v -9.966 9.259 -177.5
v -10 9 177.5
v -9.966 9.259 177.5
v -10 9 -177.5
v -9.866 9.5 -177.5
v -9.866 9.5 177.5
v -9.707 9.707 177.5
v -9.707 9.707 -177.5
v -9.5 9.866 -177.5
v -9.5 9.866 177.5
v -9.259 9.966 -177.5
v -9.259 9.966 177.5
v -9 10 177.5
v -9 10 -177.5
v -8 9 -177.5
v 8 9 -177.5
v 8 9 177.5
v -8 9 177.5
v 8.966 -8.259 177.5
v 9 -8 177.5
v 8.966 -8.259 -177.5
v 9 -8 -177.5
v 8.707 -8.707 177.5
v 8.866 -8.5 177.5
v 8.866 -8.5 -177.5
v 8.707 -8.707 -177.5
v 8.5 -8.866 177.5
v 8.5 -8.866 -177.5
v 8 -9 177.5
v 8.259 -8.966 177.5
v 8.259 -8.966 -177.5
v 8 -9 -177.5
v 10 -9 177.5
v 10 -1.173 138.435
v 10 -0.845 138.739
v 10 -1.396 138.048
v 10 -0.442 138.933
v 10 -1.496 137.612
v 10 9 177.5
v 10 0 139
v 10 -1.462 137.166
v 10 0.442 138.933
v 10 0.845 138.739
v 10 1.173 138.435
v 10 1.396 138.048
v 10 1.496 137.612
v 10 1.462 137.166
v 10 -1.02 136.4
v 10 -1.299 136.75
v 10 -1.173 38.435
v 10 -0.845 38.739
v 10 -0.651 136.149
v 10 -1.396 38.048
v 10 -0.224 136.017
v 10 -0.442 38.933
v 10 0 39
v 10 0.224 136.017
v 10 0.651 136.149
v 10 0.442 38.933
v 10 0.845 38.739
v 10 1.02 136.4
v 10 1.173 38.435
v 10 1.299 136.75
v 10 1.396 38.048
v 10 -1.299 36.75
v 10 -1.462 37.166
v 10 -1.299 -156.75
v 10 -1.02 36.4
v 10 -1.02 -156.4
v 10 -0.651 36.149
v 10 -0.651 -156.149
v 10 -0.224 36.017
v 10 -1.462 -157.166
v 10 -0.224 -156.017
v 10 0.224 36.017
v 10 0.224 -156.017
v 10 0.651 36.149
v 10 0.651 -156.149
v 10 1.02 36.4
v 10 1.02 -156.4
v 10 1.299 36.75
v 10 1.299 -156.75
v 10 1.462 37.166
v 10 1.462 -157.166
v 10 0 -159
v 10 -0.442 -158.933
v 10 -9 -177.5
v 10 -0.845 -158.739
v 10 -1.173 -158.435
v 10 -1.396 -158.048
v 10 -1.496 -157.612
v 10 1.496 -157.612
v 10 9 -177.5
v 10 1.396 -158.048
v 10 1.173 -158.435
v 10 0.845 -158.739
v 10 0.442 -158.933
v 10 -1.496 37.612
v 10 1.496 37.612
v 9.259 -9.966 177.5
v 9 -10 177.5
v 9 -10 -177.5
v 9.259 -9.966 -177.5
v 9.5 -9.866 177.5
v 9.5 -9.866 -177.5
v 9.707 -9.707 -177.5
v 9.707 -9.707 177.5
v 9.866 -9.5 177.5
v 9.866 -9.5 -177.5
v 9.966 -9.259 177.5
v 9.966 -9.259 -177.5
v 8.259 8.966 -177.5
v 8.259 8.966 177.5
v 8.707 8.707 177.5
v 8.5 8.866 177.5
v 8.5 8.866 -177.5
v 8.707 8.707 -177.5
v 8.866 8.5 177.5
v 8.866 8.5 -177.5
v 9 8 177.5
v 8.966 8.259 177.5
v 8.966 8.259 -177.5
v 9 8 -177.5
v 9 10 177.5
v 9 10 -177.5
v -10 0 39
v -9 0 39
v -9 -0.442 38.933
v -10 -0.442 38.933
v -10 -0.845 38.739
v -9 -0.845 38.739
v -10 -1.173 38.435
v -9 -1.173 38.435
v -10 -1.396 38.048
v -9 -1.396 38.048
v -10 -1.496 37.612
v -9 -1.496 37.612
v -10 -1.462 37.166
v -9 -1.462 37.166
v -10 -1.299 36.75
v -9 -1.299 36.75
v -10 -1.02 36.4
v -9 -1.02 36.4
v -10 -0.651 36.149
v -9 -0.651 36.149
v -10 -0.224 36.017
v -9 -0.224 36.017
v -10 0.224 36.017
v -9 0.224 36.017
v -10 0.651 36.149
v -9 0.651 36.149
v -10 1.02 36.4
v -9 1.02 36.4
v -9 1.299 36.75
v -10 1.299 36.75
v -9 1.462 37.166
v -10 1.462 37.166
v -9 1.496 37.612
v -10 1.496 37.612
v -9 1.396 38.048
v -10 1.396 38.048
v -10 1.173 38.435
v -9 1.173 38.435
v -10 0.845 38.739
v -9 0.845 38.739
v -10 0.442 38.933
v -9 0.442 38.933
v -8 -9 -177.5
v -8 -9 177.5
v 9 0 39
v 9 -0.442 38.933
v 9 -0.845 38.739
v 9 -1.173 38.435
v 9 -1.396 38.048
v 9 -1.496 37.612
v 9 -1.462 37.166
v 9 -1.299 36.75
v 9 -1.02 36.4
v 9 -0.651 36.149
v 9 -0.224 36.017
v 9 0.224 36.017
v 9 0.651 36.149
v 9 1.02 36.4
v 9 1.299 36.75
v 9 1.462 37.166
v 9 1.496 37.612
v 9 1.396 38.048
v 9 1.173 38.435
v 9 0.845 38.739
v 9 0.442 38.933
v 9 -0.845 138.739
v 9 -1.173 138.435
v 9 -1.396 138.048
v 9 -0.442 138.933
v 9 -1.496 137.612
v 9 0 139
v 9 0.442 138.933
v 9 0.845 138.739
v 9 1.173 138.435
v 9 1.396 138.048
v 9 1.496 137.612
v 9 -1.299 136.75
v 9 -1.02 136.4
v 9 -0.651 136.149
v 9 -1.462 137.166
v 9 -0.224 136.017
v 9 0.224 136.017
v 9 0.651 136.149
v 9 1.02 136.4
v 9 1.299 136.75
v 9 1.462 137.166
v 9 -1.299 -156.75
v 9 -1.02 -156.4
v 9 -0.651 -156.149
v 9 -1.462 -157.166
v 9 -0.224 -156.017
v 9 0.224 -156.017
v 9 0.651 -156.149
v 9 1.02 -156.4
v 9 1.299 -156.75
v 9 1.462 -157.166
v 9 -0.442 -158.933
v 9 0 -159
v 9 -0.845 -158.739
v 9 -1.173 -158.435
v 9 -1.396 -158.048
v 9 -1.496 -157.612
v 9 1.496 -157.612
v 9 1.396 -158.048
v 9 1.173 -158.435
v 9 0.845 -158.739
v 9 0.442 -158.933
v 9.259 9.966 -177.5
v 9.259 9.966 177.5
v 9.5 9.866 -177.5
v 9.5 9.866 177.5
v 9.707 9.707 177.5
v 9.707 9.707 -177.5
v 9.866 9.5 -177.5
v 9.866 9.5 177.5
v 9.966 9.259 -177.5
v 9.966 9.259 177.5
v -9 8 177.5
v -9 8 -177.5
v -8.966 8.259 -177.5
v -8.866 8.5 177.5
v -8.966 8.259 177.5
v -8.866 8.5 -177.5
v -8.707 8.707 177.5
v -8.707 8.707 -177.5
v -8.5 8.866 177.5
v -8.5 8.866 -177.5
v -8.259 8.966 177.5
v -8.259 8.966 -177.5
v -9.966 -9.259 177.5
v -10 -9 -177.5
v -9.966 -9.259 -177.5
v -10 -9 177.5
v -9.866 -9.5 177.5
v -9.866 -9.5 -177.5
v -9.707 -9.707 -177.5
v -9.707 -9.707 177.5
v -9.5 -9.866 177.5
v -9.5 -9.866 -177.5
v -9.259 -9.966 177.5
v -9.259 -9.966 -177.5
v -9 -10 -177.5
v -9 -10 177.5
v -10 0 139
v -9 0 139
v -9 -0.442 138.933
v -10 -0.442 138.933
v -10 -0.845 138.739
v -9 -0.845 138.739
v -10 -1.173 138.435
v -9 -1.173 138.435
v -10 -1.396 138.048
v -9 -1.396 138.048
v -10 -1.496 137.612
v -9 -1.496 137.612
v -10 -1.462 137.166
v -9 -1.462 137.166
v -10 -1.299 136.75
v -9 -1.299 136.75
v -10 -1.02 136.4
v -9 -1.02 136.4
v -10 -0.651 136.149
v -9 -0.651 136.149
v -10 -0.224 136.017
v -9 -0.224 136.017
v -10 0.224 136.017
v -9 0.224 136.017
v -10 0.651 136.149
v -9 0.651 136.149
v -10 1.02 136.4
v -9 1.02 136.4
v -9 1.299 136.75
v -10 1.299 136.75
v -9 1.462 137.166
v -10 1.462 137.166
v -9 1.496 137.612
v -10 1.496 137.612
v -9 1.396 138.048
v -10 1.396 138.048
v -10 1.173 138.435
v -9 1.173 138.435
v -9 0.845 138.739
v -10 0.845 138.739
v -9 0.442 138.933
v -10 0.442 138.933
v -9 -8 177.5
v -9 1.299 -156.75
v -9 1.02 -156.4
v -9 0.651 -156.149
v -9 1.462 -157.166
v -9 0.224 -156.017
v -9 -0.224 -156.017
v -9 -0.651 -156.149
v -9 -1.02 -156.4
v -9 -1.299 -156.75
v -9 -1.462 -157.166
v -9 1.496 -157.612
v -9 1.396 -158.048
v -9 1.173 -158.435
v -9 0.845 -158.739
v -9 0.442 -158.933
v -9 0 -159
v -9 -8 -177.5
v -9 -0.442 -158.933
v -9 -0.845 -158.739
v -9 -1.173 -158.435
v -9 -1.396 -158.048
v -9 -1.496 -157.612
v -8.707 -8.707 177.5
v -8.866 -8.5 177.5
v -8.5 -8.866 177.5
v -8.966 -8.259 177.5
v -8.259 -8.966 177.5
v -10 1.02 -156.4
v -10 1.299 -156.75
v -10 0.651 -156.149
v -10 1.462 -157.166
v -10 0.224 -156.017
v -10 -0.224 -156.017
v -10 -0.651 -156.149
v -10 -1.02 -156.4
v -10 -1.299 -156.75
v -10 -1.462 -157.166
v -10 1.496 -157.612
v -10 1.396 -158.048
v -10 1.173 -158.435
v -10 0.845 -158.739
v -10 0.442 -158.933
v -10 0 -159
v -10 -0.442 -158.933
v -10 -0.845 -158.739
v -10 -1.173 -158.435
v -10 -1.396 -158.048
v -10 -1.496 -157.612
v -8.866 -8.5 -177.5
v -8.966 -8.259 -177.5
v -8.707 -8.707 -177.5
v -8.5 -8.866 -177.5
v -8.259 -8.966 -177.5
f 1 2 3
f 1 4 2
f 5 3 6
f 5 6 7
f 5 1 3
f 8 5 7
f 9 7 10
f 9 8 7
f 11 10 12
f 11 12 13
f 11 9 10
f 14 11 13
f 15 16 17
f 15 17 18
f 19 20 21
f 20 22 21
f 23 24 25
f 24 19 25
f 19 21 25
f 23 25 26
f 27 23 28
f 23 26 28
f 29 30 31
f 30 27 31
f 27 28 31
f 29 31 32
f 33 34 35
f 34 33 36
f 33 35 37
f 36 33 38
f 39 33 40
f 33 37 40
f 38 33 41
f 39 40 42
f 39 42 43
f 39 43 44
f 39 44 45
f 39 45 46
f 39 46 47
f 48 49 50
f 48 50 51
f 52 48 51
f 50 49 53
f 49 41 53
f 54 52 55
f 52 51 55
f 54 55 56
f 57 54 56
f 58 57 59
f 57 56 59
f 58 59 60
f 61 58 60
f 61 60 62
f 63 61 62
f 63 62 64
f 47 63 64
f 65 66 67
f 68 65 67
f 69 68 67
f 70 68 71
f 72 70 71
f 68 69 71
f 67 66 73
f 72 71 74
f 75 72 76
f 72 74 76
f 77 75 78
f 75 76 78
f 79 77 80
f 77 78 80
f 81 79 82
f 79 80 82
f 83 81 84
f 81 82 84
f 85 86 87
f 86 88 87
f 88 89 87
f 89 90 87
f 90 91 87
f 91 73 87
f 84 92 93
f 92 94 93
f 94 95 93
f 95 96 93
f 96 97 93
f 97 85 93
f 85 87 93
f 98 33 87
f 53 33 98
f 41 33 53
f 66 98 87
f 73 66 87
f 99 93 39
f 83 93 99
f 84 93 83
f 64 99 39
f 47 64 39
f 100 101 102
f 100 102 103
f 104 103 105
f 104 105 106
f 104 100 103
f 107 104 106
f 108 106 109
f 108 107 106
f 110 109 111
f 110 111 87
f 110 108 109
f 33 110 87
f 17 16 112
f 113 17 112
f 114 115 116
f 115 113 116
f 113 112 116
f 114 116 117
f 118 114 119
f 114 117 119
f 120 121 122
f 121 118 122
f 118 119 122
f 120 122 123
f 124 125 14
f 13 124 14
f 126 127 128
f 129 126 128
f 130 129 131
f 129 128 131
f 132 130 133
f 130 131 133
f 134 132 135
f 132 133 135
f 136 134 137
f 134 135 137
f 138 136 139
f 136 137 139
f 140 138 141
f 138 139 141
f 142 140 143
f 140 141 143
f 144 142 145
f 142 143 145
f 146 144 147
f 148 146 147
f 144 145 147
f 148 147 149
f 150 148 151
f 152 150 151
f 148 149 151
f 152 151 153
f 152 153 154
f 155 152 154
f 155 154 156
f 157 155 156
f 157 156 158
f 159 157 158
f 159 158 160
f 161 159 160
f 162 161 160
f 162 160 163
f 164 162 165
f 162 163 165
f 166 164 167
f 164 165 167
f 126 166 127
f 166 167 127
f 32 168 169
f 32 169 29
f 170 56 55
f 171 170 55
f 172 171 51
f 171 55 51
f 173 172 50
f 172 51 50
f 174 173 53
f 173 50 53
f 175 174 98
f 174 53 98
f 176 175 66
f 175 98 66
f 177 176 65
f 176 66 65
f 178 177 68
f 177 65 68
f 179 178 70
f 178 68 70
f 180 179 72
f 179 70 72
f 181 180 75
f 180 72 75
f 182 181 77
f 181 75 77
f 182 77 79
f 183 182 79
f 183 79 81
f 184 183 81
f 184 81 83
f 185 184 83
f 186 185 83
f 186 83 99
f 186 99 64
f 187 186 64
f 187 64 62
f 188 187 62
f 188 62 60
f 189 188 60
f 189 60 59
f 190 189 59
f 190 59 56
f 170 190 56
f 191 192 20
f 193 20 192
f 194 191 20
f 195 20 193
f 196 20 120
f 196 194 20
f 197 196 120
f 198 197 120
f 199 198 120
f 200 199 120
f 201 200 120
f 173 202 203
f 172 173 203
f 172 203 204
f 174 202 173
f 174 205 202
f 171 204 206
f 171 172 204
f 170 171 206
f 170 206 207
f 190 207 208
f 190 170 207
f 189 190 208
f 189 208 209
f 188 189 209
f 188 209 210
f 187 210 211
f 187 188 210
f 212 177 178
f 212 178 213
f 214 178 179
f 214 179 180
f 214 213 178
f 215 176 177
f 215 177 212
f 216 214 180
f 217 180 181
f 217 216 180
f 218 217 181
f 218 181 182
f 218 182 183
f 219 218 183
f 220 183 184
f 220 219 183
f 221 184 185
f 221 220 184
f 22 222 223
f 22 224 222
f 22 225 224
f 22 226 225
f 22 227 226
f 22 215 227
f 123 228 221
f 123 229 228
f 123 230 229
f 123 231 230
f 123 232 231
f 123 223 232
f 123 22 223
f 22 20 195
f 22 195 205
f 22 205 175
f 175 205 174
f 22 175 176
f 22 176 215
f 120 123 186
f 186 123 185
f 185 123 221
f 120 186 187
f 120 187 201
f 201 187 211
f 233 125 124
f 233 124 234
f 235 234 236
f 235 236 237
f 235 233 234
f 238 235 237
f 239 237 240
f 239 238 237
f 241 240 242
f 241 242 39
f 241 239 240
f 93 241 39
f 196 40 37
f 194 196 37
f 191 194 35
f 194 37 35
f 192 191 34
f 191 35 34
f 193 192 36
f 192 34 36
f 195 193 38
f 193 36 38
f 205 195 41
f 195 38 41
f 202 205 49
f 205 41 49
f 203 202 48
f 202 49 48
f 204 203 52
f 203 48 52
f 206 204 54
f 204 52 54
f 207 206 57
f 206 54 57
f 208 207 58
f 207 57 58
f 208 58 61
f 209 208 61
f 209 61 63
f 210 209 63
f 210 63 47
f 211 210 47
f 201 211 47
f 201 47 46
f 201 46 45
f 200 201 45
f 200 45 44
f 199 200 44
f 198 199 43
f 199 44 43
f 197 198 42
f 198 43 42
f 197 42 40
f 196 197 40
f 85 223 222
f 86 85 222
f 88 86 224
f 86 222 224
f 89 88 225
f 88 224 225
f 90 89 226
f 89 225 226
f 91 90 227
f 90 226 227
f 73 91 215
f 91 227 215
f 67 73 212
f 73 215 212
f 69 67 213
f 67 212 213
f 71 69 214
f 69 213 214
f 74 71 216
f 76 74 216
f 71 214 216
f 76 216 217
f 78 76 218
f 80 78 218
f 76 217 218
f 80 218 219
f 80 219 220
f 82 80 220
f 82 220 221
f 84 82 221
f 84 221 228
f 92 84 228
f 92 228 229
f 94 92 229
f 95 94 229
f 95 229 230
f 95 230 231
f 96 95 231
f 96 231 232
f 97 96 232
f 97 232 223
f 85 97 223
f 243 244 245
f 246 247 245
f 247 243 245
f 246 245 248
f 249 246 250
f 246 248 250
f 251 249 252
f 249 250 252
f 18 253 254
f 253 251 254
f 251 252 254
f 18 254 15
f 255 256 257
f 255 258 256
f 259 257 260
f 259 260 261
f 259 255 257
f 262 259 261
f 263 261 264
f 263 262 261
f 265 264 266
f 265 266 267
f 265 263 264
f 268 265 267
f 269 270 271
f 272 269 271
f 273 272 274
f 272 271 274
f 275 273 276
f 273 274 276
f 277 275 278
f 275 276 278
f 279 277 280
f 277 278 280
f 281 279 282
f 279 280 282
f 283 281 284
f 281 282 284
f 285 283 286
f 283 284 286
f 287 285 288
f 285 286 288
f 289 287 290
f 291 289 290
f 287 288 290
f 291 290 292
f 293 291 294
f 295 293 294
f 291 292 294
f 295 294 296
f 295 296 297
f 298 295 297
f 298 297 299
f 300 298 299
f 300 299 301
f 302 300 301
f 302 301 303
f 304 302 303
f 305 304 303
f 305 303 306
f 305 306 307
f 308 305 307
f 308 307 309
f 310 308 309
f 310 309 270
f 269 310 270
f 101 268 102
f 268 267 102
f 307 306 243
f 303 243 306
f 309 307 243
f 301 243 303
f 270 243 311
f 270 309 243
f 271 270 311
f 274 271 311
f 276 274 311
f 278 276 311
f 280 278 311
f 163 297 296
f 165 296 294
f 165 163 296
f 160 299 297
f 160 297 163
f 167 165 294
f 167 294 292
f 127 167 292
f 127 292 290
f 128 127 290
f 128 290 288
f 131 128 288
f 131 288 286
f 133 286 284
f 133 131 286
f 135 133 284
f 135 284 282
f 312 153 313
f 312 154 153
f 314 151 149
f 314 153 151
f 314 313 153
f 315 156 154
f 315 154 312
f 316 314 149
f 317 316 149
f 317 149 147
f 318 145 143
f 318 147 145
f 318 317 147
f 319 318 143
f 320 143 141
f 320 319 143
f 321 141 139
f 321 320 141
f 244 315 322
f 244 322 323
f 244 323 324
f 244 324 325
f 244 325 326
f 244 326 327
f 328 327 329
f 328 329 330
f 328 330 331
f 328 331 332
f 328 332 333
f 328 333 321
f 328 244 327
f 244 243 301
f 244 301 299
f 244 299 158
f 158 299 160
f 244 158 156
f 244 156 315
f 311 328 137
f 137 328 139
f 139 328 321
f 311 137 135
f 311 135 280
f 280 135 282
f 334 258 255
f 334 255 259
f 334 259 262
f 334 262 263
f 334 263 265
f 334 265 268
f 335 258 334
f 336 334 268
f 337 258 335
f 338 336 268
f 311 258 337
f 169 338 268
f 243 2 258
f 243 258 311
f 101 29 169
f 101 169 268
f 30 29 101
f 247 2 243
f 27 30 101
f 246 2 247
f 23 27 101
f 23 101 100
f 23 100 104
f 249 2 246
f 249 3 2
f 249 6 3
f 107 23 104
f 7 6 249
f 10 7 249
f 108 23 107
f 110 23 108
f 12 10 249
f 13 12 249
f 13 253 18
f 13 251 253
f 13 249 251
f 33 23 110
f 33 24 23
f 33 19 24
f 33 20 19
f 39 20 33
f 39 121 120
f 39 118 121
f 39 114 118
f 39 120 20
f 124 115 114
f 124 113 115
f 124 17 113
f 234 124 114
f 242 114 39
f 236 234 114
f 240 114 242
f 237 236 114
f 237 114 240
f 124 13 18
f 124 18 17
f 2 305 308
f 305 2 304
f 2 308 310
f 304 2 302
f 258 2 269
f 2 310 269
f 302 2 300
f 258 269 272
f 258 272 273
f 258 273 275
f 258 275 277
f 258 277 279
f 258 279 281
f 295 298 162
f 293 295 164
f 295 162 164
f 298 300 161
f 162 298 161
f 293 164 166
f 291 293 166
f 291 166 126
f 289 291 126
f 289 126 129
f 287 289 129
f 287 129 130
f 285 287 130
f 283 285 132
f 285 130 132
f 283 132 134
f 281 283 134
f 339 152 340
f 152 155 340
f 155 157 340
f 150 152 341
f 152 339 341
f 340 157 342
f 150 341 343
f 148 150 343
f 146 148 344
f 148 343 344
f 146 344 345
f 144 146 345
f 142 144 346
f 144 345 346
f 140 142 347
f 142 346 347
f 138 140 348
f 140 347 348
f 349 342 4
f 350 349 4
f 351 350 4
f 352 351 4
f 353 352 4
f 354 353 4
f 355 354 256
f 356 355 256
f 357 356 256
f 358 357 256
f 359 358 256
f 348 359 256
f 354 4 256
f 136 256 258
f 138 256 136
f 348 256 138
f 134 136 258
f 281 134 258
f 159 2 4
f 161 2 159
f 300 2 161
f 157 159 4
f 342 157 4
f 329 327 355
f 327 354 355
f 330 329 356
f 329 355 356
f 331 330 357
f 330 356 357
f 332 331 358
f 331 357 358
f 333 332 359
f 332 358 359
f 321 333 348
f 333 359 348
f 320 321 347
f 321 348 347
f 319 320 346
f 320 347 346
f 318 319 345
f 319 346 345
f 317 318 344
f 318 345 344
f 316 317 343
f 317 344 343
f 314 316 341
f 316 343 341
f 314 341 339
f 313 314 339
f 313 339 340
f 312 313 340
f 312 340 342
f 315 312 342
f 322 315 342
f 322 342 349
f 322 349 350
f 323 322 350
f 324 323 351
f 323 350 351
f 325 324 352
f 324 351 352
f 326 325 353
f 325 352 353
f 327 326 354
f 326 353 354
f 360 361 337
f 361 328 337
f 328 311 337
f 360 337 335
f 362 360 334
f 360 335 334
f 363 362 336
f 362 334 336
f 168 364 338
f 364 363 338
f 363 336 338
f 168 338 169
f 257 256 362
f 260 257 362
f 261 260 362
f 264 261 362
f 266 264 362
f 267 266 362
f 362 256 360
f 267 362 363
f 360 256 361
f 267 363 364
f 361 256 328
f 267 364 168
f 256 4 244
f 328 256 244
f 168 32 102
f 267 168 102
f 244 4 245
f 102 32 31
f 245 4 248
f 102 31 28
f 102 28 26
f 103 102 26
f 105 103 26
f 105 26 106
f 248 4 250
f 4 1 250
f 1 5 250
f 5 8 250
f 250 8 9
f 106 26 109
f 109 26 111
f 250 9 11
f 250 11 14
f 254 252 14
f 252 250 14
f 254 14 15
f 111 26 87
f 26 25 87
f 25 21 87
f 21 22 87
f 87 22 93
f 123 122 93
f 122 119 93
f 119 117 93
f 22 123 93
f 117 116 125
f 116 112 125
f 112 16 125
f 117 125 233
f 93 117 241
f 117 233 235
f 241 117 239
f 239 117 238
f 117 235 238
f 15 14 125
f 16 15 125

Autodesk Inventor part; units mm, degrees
ref_plane "YZ Plane" through (0, 0, 0) normal (1, 0, 0) x (0, 1, 0)
ref_plane "XZ Plane" through (0, 0, 0) normal (0, 1, 0) x (-1, 0, 0)
ref_plane "XY Plane" through (0, 0, 0) normal (0, 0, 1) x (1, 0, 0)
sketch "Náčrt1" plane through (0, 0, 0) normal (0, 0, 1) x (1, 0, 0)
  line L0 (-10, -10) -> (10, -10)
  line L1 (10, -10) -> (10, 10)
  line L2 (10, 10) -> (-10, 10)
  line L3 (-10, 10) -> (-10, -10)
  line L4 (-10, -10) -> (10, 10) construction
  line L5 (10, -10) -> (-10, 10) construction
  line L6 (-9, -9) -> (9, -9)
  line L7 (9, -9) -> (9, 9)
  line L8 (9, 9) -> (-9, 9)
  line L9 (-9, 9) -> (-9, -9)
  line L10 (-9, -9) -> (9, 9) construction
  line L11 (9, -9) -> (-9, 9) construction
  point P0 (0, 0)
  dimension "d0" = 20
  dimension "d1" = 20
  dimension "d2" = 18
  dimension "d3" = 18
extrude "Vysunutí1" add sketch "Náčrt1" along normal mid plane 355
fillet "Zaoblení1" radius 1 8 edges at (-9, -9, 0) (9, -9, 0) (9, 9, 0) (-9, 9, 0) (10, -10, 0) (10, 10, 0) (-10, 10, 0) (-10, -10, 0)
sketch "Náčrt2" plane through (10, -9, 177.5) normal (1, 0, 0) x (0, 0, -1)
  line L0 (355, 18) -> (355, 0) projected
  line L1 (0, -1) -> (355, -1) projected
  point P0 (177.5, 9)
  point P1 (335, 9)
  point P2 (355, 9)
  dimension "d7" = 20
  dimension "d8" = 10
hole "Díra1" at (10, 0, -157.5) direction (-1, 0, 0) diameter 3 end through all
sketch "Náčrt3" plane through (-10, -9, 177.5) normal (-1, 0, 0) x (0, 0, 1)
  line L0 (0, 18) -> (0, 0) projected
  line L1 (-355, -1) -> (0, -1) projected
  point P0 (-177.5, 9)
  point P1 (-40, 9)
  point P2 (-140, 9)
  dimension "d16" = 40
  dimension "d17" = 10
  dimension "d18" = 100
  dimension "d19" = 10
hole "Díra2" at (-10, 0, 137.5) at (-10, 0, 37.5) direction (1, 0, 0) diameter 3 end through all
properties part number "Hlavni_pater"
